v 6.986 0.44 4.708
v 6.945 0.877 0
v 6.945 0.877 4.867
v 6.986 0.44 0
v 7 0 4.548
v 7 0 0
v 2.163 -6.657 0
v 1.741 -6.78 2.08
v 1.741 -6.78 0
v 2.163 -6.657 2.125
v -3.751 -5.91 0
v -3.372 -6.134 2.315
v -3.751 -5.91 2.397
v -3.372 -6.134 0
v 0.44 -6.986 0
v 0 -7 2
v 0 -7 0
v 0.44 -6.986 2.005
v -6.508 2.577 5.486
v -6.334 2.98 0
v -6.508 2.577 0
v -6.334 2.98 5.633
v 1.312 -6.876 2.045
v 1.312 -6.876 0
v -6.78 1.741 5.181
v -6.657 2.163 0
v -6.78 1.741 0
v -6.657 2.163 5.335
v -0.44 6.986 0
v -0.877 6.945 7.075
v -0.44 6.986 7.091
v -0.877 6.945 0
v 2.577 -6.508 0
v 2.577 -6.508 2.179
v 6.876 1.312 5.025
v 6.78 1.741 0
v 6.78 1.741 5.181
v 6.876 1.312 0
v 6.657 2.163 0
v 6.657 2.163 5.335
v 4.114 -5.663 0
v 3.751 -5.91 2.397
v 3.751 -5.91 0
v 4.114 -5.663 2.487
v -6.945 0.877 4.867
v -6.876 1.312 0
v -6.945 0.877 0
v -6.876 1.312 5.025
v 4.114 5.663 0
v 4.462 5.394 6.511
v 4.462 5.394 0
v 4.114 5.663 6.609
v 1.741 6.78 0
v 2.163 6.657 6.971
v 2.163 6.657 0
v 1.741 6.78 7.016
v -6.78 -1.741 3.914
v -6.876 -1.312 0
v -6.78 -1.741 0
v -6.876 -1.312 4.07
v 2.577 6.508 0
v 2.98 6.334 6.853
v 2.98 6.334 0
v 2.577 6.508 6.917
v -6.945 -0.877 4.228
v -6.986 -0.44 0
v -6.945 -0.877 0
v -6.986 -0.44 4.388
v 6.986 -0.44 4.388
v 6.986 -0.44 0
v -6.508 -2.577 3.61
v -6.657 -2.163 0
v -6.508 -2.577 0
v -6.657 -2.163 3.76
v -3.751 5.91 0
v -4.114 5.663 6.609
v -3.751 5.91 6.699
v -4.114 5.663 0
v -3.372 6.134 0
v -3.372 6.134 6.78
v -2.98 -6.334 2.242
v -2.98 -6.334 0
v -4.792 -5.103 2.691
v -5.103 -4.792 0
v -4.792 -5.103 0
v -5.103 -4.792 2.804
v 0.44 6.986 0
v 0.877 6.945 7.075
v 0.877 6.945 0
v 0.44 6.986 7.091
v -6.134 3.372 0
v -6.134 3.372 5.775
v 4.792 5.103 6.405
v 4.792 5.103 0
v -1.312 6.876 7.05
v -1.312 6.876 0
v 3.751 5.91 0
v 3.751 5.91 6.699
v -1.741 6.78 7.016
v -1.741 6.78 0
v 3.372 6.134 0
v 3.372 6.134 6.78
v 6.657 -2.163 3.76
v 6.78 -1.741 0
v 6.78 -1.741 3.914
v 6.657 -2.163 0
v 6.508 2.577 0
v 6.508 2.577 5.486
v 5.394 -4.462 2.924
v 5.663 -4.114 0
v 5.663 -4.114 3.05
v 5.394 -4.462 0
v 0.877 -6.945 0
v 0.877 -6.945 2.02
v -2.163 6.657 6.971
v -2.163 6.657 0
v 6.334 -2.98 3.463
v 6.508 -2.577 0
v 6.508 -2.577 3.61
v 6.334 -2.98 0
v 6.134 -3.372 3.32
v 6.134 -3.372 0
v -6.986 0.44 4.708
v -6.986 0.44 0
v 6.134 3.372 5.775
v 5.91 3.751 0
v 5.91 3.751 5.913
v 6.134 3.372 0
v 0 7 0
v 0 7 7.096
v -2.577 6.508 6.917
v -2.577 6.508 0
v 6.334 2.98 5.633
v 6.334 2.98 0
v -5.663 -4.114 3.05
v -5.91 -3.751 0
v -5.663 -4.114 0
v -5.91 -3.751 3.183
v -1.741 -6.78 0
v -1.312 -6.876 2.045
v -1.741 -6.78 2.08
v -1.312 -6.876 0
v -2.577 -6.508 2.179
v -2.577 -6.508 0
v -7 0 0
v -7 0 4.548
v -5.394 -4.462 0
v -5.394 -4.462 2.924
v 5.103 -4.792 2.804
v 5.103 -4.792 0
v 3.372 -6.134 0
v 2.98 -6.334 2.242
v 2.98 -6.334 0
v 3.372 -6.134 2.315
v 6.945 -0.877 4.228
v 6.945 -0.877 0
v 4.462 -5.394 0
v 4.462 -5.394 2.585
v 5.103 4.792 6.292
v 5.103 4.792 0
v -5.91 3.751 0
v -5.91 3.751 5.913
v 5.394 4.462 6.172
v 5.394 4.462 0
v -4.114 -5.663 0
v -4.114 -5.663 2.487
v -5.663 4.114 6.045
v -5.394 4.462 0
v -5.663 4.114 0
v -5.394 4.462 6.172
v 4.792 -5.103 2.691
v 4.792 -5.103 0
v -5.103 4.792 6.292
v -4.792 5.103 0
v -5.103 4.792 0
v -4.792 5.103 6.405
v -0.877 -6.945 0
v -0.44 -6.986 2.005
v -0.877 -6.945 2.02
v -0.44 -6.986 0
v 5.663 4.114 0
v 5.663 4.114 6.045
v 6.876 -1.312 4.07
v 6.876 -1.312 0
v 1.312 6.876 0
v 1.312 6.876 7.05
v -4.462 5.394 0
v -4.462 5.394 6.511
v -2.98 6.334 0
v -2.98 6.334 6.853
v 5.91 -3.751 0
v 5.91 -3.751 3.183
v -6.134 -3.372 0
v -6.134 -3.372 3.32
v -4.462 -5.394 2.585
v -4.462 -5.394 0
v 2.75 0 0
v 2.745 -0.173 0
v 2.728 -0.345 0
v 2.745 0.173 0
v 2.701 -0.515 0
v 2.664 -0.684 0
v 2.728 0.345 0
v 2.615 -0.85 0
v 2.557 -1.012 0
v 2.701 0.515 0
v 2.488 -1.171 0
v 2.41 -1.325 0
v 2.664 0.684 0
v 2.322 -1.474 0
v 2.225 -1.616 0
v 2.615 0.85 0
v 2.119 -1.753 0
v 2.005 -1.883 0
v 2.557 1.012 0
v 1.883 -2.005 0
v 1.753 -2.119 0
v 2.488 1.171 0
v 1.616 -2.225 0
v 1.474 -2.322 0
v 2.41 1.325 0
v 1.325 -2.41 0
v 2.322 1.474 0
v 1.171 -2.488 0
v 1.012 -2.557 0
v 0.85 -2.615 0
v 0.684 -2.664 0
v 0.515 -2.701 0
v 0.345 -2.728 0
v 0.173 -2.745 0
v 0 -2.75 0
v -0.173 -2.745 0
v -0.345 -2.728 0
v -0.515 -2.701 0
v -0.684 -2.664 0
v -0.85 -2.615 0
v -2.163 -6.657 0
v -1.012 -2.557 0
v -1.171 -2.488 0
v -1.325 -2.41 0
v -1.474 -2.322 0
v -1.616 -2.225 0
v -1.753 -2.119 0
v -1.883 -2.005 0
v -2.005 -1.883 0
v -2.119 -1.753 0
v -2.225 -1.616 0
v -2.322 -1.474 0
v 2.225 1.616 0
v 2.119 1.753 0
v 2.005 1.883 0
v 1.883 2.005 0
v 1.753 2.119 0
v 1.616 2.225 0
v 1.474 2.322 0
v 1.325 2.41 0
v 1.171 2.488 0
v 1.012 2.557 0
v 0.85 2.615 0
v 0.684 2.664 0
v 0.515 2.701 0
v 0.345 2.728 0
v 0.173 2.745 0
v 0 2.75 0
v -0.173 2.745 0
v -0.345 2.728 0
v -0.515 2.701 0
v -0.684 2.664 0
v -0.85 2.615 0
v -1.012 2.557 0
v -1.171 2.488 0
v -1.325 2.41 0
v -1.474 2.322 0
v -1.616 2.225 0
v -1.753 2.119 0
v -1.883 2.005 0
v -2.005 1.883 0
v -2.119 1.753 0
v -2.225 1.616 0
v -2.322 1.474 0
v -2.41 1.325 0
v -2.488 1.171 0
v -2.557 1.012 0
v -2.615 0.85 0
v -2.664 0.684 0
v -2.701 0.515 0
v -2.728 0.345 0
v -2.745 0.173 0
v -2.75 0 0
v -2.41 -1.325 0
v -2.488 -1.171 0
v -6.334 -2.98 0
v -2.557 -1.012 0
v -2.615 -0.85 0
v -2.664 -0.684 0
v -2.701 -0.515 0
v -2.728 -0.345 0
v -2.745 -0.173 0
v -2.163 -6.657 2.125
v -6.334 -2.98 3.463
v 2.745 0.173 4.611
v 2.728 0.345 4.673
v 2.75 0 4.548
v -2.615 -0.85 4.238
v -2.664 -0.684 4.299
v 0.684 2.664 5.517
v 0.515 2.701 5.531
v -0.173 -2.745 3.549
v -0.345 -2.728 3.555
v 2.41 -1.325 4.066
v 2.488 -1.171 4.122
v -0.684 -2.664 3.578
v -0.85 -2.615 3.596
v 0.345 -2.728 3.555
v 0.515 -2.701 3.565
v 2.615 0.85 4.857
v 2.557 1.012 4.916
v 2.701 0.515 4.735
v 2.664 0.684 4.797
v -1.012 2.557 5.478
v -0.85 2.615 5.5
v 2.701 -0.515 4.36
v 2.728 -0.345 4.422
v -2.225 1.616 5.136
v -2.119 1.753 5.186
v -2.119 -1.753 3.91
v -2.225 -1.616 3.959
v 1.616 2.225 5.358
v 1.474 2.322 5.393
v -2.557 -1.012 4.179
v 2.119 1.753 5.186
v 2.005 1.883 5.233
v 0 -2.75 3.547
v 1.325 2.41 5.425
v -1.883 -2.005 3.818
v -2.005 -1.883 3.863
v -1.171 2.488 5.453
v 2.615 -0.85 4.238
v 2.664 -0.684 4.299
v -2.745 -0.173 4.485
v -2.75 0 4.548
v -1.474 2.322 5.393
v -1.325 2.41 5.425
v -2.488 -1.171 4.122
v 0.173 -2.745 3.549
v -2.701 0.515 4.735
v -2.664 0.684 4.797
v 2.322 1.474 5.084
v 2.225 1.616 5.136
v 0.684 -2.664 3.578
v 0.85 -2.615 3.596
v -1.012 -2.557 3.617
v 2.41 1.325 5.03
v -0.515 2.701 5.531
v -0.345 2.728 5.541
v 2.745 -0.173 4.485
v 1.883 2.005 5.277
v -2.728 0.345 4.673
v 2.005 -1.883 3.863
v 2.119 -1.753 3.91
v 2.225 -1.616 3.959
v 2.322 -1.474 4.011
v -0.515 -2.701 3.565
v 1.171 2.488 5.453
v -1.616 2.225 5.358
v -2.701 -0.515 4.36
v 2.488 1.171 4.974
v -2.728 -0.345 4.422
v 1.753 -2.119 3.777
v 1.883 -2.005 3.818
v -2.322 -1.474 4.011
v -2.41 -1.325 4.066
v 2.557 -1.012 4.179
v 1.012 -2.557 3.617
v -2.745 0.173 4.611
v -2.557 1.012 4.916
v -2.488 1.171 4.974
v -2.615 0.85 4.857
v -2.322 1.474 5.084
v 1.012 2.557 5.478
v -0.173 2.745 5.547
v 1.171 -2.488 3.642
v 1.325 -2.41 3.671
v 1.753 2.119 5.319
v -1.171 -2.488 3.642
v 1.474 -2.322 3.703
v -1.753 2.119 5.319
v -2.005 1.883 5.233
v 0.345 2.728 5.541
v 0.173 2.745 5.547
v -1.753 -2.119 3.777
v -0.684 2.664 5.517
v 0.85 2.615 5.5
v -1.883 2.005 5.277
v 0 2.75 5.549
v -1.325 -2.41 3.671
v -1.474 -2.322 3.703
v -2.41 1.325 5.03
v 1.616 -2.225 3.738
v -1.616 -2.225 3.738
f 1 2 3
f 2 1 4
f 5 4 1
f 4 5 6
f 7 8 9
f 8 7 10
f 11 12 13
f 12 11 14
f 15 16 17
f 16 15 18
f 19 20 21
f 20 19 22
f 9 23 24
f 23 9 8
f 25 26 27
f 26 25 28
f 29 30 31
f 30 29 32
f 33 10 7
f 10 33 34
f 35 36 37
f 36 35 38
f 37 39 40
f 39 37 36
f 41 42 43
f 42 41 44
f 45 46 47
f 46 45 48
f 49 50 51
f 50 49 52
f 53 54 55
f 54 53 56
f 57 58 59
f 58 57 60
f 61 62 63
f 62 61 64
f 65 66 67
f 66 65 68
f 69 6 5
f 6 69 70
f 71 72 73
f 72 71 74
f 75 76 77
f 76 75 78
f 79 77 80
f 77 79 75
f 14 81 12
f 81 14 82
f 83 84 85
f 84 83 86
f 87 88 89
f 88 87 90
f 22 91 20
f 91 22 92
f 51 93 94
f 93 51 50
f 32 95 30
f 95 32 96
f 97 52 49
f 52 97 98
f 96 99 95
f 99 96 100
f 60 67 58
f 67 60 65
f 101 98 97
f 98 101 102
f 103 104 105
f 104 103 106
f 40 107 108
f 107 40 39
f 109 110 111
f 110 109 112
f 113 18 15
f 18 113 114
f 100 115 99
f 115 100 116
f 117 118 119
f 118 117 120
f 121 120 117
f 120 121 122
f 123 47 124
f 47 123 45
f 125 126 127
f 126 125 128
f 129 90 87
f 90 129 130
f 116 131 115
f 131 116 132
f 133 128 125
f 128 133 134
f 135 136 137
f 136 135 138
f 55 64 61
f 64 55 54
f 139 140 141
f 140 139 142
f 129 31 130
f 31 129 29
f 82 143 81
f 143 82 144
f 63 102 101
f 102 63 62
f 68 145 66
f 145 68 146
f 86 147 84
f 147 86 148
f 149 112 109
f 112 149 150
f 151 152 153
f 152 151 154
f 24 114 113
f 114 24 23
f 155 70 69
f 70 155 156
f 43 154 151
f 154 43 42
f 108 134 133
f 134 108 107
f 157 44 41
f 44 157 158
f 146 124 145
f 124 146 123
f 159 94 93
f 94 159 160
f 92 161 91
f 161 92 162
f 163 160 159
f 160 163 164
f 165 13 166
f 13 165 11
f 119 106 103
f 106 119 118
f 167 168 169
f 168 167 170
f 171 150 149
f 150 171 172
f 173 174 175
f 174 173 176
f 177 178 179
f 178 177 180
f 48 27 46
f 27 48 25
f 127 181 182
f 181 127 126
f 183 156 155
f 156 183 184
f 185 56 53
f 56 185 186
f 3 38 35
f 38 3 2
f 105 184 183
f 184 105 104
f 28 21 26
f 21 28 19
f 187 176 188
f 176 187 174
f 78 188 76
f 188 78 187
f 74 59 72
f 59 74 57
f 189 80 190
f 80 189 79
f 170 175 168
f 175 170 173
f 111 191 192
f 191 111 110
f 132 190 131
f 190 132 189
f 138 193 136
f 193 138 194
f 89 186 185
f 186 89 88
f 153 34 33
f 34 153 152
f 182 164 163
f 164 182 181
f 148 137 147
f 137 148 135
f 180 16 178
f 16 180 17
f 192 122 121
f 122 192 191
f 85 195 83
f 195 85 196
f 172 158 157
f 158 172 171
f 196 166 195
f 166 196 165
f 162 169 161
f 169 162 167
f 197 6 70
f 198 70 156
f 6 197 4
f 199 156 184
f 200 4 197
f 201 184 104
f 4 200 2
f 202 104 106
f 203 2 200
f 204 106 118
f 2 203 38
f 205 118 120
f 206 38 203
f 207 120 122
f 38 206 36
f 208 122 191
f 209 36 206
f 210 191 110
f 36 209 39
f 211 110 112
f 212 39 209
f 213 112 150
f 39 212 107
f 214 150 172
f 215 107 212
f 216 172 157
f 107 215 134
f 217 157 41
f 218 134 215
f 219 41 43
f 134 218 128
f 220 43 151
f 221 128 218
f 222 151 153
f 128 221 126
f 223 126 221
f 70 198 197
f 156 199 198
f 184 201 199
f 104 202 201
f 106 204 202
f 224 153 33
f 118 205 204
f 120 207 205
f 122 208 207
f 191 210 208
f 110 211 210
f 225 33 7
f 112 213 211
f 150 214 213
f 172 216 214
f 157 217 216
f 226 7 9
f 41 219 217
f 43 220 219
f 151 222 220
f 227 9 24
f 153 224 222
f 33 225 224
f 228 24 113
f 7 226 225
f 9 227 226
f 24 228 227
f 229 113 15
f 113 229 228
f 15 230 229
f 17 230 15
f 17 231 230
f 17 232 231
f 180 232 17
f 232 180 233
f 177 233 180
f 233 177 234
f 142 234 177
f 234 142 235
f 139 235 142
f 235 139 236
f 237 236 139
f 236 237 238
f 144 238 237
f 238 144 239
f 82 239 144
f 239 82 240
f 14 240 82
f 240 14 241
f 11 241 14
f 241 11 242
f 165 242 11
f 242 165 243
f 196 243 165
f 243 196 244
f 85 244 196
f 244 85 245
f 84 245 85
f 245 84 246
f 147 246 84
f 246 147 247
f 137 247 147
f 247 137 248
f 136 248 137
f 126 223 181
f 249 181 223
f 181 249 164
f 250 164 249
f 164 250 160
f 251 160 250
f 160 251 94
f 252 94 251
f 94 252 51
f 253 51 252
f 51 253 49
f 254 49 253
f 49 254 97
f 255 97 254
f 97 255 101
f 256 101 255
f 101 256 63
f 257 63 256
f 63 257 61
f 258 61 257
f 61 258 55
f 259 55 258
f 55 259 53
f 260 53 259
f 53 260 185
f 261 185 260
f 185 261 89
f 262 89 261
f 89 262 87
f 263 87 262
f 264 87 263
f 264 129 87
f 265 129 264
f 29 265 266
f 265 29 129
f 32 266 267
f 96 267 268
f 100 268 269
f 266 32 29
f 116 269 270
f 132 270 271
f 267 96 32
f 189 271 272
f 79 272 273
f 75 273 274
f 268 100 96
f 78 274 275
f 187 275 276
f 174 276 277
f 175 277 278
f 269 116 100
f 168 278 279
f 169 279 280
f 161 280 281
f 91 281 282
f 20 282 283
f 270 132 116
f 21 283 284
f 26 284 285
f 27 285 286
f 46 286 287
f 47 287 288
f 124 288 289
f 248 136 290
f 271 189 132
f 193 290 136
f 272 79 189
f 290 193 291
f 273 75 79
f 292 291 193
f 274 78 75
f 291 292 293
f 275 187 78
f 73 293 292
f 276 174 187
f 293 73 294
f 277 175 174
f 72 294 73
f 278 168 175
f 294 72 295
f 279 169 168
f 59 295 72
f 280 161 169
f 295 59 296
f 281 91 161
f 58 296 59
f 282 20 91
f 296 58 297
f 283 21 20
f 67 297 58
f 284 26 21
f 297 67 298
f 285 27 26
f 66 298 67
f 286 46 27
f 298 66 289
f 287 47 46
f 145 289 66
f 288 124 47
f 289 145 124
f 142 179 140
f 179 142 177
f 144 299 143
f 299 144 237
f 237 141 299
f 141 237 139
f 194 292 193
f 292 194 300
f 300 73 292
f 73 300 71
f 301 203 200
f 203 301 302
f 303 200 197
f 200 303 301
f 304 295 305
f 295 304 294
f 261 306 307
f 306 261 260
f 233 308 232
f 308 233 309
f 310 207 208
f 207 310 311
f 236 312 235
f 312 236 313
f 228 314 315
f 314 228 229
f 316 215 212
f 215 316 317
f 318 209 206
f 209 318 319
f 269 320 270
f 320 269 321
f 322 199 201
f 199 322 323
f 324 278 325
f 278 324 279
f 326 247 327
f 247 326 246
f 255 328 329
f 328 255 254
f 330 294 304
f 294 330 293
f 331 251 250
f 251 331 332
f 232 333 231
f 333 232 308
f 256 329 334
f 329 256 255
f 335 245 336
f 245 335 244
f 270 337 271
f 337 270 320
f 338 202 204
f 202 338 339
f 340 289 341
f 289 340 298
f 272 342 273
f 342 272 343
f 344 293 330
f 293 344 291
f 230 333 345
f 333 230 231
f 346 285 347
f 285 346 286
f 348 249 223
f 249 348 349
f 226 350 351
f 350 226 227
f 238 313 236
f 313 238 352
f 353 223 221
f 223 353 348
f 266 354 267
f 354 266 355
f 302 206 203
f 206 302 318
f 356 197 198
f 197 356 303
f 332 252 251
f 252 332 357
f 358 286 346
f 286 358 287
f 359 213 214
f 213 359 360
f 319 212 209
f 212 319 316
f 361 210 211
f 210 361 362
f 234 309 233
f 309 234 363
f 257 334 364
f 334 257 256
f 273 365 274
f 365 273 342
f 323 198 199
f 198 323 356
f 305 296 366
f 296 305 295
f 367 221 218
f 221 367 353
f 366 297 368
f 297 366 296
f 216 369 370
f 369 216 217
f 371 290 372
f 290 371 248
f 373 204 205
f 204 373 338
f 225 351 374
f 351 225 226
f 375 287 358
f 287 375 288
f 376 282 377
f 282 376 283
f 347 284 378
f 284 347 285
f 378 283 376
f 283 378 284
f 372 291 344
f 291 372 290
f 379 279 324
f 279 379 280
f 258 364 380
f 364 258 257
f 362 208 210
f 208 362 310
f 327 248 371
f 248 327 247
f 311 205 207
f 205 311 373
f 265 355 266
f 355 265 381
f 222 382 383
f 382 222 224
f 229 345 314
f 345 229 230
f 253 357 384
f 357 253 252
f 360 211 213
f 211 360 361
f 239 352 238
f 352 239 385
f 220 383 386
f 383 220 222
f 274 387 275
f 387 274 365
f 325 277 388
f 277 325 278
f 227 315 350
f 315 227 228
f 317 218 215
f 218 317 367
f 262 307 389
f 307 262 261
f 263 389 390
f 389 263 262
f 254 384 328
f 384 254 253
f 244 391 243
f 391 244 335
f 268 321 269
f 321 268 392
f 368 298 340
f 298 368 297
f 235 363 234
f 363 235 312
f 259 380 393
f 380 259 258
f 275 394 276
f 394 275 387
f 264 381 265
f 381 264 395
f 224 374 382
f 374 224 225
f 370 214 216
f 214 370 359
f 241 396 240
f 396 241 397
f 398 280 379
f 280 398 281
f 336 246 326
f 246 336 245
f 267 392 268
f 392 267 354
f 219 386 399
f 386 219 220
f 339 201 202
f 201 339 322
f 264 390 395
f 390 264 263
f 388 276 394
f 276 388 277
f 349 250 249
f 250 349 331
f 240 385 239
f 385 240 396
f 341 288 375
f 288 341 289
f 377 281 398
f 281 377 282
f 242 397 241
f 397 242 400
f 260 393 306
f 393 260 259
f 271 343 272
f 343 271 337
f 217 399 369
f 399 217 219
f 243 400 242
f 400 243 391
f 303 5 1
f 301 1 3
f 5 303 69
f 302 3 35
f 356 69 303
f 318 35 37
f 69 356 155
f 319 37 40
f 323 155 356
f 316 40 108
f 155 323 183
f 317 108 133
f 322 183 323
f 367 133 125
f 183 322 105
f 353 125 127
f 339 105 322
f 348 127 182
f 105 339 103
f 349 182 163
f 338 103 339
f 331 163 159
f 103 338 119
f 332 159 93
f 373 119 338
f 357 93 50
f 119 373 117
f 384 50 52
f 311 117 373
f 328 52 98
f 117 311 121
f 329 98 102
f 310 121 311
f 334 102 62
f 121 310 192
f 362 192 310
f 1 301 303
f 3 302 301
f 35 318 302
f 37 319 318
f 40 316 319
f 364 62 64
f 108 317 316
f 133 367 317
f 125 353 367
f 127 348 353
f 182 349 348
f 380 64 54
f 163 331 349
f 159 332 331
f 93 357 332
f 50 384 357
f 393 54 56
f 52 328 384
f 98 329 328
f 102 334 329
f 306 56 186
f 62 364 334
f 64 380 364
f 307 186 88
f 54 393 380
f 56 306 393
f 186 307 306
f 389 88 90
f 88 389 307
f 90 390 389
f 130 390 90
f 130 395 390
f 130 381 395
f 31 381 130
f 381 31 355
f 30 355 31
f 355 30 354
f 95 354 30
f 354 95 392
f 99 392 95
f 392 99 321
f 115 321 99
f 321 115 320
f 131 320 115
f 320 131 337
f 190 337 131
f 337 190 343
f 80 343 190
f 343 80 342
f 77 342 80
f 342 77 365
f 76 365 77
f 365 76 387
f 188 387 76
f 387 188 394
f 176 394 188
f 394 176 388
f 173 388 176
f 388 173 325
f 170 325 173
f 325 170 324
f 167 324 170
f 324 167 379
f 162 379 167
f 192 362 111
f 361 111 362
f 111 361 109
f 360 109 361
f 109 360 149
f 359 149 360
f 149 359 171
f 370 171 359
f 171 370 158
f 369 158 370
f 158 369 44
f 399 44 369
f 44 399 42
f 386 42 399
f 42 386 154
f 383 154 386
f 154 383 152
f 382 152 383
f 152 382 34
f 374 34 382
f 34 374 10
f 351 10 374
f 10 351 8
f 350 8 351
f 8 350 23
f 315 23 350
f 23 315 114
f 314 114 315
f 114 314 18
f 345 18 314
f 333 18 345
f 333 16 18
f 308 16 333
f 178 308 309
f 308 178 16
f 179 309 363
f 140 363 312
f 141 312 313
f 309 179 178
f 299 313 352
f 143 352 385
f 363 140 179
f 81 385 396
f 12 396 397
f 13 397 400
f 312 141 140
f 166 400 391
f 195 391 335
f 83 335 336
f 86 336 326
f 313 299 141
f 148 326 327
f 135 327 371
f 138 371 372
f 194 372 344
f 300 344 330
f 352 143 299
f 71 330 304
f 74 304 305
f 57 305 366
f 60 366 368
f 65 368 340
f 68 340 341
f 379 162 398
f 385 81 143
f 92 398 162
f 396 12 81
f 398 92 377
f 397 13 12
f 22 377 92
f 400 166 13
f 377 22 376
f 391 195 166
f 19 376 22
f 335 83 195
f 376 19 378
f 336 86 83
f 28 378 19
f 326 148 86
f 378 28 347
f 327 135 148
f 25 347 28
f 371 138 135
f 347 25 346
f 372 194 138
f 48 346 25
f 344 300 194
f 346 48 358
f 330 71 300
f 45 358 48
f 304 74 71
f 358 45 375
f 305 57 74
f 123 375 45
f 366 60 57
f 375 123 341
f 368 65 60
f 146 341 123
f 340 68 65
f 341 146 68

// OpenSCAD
$fn = 100;

d = 14;
h = 20;
d_h = 5.5;

angle = 20; // Deg
base_thickness = 2;

epsilon = 0.4;
tool_size = 100;
// y=mx+c; m=tan(theta); x=d/2 => c=mx
c = tan(angle)*d/2;

difference() {
    translate([0,0,h/2]) cylinder(d=d, h=h, center=true);
    translate([0,0,(h-epsilon)/2]) cylinder(d=d_h, h=h+2*epsilon, center=true);
    translate([0,0,c+base_thickness]) rotate([angle,0,0]) translate([0,0,tool_size/2]) cube(tool_size, center=true);
}
